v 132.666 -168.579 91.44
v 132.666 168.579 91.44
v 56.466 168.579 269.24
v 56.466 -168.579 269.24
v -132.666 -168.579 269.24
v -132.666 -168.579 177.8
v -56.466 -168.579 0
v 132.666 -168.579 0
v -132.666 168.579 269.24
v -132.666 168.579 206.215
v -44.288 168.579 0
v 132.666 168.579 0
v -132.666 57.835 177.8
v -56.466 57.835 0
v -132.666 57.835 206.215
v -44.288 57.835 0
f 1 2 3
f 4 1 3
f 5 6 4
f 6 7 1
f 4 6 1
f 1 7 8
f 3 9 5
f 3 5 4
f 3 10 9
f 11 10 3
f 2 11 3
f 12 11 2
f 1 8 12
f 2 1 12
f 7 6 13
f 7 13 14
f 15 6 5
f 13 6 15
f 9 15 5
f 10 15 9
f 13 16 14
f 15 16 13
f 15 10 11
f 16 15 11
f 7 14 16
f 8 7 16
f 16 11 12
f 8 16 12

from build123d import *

# Parameters (mm, degrees)
F0_W     = 265.33243
F0_H     = 337.1588
F1_DEPTH = 269.24
F3_DEPTH = 346.71
F5_DEPTH = 110.744


with BuildPart() as f1:
    # F0 (on Top) → F1 (new body)
    with BuildSketch(Plane.XY):
        Rectangle(F0_W, F0_H)
    extrude(amount=F1_DEPTH)

    # F2 (on face) → F3 (cut)
    with BuildSketch(Plane(origin=(0, 168.5794, 0), x_dir=(-1, 0, 0), z_dir=(0, 1, 0))):
        Polygon((-132.666215, 91.44), (-56.466215, 269.24), (-132.666215, 269.24), align=None)
        Polygon((56.466215, 0), (132.666215, 0), (132.666215, 177.8), align=None)
    extrude(amount=-F3_DEPTH, mode=Mode.SUBTRACT)

    # F4 (on face) → F5 (cut)
    with BuildSketch(Plane(origin=(0, 168.5794, 0), x_dir=(-1, 0, 0), z_dir=(0, 1, 0))):
        Polygon((132.666215, 177.8), (132.666215, 206.214771), (44.288456, 0), (56.466215, 0), align=None)
    extrude(amount=-F5_DEPTH, mode=Mode.SUBTRACT)


solid = f1.part
